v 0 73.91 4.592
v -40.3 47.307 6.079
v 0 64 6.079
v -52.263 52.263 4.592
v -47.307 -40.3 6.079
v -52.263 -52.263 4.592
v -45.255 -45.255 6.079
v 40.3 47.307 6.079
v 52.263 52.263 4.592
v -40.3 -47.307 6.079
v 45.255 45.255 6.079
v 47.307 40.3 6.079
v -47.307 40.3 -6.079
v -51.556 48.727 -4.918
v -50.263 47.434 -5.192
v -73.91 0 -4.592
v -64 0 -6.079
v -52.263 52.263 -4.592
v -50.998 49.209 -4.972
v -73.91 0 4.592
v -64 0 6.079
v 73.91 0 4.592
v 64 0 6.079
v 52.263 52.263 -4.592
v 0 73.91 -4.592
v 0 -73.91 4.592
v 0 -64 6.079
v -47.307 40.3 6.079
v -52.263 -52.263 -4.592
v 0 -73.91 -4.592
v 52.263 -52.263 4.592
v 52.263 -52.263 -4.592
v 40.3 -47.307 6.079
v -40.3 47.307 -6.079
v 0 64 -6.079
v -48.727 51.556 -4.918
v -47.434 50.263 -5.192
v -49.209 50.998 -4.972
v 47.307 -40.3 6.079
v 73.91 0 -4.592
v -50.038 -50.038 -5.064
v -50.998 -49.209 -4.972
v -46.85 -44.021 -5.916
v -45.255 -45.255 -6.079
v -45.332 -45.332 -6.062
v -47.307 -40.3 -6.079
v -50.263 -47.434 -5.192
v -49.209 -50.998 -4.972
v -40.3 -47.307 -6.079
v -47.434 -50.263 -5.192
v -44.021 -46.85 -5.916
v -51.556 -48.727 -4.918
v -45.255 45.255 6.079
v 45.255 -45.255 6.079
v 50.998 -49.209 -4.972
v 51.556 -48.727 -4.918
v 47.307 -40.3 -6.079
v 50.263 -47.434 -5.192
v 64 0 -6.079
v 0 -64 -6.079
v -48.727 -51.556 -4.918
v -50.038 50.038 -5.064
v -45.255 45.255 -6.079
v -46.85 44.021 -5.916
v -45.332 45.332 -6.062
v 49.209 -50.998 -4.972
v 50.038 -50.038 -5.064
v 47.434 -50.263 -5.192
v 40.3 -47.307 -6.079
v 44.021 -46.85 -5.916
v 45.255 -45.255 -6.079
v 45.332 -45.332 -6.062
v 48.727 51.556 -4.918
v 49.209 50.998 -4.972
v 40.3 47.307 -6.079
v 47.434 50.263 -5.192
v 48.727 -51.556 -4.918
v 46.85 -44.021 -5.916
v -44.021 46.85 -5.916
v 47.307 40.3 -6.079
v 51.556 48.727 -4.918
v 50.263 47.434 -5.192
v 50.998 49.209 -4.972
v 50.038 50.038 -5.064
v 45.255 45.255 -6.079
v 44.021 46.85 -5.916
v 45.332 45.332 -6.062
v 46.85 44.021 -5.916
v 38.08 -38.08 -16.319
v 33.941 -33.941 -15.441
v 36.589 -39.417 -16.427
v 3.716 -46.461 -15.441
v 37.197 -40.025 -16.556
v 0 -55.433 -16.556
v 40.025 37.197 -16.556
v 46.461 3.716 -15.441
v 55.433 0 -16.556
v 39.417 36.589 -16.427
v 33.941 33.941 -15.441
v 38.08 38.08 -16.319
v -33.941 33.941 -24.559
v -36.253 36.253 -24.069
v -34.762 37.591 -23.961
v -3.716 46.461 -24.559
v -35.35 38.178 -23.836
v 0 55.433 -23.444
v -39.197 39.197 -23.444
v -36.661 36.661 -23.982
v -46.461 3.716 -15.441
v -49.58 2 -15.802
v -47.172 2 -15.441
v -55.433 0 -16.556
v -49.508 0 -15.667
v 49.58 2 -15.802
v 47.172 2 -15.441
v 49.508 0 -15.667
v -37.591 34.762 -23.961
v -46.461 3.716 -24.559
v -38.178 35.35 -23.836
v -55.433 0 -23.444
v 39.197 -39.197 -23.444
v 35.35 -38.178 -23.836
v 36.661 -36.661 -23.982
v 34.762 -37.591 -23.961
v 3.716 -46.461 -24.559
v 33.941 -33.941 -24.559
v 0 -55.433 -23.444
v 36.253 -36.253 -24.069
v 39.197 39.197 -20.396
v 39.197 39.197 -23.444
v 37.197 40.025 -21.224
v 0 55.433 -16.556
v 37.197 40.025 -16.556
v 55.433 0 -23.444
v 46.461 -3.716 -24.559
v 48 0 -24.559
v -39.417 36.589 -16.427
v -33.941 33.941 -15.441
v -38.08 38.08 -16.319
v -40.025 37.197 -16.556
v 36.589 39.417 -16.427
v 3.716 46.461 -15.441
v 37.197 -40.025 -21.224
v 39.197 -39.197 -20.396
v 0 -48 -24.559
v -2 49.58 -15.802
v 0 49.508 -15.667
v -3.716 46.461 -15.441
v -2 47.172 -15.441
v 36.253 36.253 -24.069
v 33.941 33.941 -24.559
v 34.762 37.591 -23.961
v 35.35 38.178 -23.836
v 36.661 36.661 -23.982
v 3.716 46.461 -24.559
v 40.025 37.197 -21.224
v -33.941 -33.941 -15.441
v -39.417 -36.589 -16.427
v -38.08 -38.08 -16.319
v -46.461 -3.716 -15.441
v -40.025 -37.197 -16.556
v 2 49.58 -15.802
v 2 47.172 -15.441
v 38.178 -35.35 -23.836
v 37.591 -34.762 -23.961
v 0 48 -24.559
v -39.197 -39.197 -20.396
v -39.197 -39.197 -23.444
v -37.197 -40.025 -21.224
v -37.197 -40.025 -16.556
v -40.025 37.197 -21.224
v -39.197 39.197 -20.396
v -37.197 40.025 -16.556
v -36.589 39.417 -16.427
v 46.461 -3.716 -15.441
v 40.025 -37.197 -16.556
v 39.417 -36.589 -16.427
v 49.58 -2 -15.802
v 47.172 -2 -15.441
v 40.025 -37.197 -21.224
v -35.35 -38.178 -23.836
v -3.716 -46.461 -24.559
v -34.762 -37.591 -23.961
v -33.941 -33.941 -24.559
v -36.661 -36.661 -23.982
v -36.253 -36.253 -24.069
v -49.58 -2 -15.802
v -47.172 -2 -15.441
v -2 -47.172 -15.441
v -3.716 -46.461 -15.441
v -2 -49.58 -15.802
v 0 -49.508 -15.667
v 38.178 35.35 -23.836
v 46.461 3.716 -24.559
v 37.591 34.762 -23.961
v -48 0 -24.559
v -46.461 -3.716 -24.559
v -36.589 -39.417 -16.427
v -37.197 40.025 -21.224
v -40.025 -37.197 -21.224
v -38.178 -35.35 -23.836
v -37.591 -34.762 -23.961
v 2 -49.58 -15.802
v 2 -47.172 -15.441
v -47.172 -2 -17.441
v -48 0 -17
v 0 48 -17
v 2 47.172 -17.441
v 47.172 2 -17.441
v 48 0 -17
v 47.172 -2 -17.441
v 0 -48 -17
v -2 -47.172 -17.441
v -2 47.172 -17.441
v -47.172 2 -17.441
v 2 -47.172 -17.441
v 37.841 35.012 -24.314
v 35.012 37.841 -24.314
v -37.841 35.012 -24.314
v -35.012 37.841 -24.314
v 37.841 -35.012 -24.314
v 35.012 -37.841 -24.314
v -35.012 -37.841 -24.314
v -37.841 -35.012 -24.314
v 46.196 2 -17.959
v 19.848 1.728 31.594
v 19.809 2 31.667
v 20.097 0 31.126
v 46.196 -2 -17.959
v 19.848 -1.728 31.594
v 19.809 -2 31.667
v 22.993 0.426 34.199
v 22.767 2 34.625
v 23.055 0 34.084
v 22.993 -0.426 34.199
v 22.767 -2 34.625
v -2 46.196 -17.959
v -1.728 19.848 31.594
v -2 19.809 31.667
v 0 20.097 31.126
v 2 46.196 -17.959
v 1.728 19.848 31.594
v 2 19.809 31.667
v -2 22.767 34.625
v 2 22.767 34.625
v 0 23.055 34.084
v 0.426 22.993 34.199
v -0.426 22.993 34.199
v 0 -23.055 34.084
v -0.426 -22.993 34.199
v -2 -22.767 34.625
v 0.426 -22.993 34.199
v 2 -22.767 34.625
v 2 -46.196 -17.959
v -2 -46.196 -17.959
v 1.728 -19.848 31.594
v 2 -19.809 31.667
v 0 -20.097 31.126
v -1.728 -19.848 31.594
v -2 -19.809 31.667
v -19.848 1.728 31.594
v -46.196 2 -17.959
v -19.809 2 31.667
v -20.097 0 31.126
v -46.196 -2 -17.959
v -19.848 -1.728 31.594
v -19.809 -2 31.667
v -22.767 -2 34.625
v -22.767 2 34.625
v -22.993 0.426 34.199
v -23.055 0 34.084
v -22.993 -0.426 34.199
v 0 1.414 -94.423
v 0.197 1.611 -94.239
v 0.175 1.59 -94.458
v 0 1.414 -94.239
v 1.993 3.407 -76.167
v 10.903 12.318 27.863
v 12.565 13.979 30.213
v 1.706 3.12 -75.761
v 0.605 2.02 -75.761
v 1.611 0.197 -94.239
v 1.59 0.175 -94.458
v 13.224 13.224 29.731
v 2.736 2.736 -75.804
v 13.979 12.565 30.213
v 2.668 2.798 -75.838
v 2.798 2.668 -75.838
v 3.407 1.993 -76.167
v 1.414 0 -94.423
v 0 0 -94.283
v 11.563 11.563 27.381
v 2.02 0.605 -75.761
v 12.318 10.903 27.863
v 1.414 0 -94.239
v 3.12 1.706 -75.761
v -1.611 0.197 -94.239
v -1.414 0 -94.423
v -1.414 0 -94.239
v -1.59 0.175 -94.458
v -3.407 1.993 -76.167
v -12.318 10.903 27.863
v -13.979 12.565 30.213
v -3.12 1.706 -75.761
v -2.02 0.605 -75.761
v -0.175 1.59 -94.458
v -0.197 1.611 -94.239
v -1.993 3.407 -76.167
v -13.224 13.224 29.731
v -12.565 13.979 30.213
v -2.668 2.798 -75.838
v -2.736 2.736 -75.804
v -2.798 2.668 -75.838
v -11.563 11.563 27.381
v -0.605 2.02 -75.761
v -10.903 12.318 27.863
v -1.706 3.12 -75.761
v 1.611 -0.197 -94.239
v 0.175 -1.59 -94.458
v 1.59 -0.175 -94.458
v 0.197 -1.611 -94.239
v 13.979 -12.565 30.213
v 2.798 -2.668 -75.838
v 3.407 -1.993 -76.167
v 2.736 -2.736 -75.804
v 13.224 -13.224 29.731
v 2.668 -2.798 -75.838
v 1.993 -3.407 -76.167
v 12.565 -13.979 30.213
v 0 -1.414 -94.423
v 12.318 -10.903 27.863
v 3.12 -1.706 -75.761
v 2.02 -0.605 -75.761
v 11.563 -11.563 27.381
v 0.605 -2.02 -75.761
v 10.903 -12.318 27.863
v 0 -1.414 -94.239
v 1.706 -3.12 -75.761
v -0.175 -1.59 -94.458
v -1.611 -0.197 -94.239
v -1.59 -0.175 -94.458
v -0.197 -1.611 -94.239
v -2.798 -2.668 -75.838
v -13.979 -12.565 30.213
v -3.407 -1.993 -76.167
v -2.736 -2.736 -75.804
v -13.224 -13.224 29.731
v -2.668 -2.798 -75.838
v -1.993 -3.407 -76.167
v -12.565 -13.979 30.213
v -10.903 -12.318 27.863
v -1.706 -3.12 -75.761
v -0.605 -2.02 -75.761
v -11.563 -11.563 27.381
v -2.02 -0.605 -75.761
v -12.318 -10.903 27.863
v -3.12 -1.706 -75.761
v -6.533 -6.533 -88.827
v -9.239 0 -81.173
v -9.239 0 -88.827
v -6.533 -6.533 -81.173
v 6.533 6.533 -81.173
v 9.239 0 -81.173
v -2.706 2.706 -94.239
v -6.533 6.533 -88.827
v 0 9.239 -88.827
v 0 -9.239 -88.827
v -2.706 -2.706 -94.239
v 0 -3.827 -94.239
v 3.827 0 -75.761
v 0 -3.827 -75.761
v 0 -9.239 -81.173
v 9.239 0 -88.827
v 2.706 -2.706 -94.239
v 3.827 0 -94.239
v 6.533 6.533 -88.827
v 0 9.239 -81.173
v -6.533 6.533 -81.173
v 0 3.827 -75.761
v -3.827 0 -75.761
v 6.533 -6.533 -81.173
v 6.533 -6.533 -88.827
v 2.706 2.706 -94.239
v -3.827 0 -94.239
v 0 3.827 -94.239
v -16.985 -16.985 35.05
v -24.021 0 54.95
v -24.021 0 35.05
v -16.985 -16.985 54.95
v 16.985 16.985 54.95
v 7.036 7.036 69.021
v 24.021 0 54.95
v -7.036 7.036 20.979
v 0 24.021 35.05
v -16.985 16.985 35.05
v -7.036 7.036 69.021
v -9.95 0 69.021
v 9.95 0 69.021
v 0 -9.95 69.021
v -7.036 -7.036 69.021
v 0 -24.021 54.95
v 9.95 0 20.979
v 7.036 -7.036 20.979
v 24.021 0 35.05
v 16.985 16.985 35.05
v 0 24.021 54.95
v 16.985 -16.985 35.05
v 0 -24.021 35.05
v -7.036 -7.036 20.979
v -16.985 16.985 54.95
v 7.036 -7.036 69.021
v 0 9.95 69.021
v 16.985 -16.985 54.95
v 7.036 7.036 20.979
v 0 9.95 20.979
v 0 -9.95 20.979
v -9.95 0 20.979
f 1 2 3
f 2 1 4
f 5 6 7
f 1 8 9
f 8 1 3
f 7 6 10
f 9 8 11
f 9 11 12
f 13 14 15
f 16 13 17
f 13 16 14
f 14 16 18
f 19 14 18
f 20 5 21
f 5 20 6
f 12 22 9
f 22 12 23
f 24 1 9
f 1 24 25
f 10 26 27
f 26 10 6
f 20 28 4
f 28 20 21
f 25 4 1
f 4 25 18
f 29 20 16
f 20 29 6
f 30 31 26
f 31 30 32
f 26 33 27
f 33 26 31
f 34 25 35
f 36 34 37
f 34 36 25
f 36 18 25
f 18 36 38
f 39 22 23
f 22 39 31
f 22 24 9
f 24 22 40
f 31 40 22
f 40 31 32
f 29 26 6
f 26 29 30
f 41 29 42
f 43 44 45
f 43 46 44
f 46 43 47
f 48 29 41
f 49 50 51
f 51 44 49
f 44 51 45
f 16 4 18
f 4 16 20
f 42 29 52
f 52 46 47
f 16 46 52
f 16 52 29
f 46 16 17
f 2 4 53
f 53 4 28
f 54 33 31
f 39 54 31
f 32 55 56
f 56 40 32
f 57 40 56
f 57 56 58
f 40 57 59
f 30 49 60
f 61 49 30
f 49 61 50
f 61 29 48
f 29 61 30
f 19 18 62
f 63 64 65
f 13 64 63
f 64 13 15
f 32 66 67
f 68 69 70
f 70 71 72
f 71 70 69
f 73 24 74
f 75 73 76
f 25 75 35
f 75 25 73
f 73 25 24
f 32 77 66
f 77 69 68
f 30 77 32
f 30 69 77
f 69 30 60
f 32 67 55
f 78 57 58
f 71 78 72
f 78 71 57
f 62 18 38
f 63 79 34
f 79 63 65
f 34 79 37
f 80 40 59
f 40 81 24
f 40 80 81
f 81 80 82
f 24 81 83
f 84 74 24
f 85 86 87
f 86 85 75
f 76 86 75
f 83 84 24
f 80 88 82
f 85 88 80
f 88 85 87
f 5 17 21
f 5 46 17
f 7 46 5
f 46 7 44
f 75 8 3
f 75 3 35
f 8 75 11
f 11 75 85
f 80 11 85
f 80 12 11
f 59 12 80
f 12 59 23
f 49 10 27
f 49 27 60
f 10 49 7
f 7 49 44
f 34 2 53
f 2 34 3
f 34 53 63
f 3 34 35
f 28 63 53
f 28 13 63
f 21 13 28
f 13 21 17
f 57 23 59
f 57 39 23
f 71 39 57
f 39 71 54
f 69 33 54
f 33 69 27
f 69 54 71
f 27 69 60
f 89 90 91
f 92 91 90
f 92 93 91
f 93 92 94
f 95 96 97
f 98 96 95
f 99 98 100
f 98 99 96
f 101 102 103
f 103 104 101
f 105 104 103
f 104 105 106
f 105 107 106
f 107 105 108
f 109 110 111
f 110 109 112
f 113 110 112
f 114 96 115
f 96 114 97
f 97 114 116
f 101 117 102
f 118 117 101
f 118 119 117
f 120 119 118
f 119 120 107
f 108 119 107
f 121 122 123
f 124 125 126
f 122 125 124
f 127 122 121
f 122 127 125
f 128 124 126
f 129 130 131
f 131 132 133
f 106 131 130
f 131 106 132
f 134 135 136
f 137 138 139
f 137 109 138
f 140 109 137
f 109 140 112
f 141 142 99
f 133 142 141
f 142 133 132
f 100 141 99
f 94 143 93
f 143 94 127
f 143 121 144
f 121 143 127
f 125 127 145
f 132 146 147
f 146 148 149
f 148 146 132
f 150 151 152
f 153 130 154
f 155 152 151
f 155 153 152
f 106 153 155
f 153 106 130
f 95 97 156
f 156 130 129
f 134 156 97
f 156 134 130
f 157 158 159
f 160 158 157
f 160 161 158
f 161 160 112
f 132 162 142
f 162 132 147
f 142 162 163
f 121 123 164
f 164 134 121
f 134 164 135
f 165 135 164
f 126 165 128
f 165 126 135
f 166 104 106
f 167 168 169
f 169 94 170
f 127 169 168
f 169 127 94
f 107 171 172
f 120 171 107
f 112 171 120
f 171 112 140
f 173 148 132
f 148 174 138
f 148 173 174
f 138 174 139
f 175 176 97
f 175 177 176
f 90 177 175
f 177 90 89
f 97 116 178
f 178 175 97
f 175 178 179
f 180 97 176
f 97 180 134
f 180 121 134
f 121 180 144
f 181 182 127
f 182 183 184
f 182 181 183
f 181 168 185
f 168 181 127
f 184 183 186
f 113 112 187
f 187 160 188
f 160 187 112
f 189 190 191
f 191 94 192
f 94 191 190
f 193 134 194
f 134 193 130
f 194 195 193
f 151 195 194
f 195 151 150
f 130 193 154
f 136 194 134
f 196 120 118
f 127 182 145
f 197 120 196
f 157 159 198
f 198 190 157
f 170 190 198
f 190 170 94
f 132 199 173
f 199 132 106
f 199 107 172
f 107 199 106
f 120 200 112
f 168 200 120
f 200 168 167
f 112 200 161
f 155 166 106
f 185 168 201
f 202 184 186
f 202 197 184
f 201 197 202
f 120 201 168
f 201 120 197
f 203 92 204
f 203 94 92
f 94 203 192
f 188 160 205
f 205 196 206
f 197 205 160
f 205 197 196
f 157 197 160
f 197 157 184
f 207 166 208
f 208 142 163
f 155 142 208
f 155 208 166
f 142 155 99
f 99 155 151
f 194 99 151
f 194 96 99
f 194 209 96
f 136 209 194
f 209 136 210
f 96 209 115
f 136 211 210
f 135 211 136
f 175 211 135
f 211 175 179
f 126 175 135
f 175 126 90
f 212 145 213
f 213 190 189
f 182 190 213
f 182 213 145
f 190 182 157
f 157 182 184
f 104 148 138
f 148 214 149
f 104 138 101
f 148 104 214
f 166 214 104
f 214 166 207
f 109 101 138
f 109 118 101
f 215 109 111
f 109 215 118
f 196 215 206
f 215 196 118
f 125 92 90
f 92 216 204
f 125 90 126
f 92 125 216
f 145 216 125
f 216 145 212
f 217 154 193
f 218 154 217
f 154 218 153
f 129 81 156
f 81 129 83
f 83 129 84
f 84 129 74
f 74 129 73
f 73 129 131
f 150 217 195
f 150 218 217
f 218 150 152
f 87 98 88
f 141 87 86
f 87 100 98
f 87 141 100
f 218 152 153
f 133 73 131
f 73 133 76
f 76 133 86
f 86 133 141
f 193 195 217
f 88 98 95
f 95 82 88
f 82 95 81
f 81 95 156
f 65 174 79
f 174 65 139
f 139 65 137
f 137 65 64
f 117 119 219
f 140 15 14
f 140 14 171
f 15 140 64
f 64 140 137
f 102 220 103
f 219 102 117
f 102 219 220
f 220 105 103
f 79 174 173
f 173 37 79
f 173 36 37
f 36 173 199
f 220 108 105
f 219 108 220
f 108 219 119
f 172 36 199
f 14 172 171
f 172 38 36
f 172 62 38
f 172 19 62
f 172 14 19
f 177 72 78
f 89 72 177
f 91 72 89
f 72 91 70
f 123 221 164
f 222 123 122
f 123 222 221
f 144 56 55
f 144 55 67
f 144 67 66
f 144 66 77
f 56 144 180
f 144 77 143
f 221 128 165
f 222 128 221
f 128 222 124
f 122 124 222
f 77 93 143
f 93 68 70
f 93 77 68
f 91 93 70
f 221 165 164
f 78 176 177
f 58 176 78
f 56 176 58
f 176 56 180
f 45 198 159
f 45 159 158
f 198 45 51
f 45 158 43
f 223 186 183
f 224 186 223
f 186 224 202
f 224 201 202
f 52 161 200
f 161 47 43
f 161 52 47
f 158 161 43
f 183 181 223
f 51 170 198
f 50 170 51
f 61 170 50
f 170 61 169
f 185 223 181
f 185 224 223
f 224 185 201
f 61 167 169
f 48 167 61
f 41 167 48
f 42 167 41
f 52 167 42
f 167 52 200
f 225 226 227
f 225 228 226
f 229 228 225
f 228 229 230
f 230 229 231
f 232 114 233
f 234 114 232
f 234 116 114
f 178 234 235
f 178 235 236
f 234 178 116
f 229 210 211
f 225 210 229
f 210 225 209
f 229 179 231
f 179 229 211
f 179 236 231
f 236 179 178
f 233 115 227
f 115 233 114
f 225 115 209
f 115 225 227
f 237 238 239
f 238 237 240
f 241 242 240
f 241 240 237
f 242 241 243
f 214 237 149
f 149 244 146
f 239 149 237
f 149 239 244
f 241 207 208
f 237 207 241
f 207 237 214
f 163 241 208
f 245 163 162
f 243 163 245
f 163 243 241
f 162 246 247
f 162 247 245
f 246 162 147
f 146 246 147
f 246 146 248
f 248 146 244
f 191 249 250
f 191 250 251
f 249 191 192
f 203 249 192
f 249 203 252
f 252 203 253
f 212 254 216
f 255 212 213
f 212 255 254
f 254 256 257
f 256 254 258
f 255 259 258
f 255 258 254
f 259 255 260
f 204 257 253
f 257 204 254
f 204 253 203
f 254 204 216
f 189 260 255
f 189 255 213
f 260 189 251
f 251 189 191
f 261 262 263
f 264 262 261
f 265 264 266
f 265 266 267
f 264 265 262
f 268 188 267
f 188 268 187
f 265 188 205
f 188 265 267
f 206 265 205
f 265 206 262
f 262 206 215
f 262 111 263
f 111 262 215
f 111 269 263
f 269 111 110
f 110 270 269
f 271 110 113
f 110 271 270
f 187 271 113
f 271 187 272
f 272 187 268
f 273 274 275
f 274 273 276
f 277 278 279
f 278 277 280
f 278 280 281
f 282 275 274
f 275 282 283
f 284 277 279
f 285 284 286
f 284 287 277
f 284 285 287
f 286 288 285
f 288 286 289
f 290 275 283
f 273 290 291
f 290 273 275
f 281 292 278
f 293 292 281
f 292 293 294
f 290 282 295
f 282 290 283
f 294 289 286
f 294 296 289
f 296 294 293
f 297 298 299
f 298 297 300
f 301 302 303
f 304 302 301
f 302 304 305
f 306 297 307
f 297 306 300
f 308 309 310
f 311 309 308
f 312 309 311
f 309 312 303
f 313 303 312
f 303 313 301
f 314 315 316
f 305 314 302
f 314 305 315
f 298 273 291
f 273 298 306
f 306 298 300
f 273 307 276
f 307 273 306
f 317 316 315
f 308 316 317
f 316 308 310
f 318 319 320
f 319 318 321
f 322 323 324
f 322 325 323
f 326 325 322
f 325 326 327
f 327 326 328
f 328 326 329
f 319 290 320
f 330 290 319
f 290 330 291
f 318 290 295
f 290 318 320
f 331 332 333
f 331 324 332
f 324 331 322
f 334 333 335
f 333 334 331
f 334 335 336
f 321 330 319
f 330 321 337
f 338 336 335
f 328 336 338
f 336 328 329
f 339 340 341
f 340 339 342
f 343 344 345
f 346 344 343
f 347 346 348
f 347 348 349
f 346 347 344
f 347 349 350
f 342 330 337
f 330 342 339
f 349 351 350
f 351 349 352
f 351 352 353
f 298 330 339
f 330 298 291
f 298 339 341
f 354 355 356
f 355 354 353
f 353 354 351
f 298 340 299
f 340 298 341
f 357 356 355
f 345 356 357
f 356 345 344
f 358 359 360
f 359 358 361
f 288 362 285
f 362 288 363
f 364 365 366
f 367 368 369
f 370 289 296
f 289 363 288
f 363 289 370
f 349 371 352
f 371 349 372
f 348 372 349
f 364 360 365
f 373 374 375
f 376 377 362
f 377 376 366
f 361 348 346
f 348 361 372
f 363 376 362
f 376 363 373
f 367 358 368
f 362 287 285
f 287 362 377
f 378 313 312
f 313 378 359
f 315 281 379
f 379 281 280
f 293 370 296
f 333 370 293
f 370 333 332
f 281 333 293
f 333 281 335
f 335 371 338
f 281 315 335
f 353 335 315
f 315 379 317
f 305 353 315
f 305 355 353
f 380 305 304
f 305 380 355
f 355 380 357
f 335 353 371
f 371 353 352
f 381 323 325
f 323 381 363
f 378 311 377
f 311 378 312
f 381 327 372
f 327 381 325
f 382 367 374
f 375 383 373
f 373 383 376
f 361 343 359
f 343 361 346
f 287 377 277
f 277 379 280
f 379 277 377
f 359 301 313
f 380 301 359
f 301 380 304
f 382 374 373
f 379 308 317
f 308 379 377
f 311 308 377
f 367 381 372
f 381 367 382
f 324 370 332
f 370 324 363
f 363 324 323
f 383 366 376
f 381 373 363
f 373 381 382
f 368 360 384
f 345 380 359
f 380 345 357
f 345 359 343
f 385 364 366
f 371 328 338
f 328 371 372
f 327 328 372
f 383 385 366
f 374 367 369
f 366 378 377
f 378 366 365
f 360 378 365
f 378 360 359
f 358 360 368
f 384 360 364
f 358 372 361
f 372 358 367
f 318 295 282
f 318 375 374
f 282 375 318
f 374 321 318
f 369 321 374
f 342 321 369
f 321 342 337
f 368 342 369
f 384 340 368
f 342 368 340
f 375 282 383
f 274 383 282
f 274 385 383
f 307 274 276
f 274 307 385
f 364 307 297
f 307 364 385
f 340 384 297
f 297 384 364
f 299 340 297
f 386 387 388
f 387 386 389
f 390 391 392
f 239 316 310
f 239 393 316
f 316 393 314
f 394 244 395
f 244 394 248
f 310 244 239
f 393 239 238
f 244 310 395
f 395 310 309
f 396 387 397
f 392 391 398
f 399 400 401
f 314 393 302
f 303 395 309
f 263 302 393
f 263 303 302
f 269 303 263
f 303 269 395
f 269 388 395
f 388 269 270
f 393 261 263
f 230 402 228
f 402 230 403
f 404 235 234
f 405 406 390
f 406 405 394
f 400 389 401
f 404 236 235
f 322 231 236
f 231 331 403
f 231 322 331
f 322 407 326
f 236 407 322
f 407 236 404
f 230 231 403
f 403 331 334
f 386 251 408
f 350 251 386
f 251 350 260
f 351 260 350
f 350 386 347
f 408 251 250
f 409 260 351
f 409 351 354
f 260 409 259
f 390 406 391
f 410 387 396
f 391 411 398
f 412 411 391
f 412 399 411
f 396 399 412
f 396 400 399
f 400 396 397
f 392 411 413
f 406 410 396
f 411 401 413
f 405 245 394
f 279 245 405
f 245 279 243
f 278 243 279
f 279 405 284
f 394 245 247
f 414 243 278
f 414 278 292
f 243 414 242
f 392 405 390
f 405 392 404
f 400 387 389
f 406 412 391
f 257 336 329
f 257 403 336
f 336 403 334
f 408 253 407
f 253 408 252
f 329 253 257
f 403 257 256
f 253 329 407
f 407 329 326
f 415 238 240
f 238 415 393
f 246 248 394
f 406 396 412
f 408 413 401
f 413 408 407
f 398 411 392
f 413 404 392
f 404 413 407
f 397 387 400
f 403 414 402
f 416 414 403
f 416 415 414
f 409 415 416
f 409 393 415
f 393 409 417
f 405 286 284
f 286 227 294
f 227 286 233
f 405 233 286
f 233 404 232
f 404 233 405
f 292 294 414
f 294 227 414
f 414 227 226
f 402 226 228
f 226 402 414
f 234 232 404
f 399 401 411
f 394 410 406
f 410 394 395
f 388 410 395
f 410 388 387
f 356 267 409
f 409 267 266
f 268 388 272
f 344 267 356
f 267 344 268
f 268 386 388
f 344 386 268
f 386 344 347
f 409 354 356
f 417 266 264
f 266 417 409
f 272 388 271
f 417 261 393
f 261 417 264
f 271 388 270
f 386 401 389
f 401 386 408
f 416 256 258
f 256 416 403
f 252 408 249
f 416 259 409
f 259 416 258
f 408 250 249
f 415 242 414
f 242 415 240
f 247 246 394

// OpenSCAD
$fn=8;

module ring(radius)
{
	difference() {
		scale(v = [1, 1, 0.15])
			sphere(r = radius);
		cylinder(h = radius * 2, r1 = radius * 0.8, r2 = radius * 0.8, center = true);
	}
}

module spoke(thickness, length, angle, displacement)
{
	translate(v = [displacement, 0, 0])
		rotate(a = angle, v = [0, 1, 0])
			cube(size = [thickness, thickness, length], center = true);
}

module spoke_set(thickness, length, angle, displacement)
{
	spoke(thickness, length, angle, displacement);
	rotate(a = 90, v = [0, 0, 1])
		spoke(thickness, length, angle, displacement);
	rotate(a = -90, v = [0, 0, 1])
		spoke(thickness, length, angle, displacement);
	rotate(a = 180, v = [0, 0, 1])
		spoke(thickness, length, angle, displacement);
}

union()
{
	ring(80);
	translate(v = [0, 0, -20])
		ring(60);
	translate(v = [0, 0, -13])
	rotate(a = 45, v = [0, 0, 1])
		spoke_set(4, 28, 45, 60);
	translate(v = [0, 0, 13])
	spoke_set(4, 68, -28, 32);
	rotate(a = 45, v = [0, 0, 1])
		translate(v = [0, 0, -25])
			spoke_set(2, 140, 8, 10);
	translate(v = [0, 0, -85])
		sphere(r = 10);
	translate(v = [0, 0, 45])
		sphere(r = 26);
}
